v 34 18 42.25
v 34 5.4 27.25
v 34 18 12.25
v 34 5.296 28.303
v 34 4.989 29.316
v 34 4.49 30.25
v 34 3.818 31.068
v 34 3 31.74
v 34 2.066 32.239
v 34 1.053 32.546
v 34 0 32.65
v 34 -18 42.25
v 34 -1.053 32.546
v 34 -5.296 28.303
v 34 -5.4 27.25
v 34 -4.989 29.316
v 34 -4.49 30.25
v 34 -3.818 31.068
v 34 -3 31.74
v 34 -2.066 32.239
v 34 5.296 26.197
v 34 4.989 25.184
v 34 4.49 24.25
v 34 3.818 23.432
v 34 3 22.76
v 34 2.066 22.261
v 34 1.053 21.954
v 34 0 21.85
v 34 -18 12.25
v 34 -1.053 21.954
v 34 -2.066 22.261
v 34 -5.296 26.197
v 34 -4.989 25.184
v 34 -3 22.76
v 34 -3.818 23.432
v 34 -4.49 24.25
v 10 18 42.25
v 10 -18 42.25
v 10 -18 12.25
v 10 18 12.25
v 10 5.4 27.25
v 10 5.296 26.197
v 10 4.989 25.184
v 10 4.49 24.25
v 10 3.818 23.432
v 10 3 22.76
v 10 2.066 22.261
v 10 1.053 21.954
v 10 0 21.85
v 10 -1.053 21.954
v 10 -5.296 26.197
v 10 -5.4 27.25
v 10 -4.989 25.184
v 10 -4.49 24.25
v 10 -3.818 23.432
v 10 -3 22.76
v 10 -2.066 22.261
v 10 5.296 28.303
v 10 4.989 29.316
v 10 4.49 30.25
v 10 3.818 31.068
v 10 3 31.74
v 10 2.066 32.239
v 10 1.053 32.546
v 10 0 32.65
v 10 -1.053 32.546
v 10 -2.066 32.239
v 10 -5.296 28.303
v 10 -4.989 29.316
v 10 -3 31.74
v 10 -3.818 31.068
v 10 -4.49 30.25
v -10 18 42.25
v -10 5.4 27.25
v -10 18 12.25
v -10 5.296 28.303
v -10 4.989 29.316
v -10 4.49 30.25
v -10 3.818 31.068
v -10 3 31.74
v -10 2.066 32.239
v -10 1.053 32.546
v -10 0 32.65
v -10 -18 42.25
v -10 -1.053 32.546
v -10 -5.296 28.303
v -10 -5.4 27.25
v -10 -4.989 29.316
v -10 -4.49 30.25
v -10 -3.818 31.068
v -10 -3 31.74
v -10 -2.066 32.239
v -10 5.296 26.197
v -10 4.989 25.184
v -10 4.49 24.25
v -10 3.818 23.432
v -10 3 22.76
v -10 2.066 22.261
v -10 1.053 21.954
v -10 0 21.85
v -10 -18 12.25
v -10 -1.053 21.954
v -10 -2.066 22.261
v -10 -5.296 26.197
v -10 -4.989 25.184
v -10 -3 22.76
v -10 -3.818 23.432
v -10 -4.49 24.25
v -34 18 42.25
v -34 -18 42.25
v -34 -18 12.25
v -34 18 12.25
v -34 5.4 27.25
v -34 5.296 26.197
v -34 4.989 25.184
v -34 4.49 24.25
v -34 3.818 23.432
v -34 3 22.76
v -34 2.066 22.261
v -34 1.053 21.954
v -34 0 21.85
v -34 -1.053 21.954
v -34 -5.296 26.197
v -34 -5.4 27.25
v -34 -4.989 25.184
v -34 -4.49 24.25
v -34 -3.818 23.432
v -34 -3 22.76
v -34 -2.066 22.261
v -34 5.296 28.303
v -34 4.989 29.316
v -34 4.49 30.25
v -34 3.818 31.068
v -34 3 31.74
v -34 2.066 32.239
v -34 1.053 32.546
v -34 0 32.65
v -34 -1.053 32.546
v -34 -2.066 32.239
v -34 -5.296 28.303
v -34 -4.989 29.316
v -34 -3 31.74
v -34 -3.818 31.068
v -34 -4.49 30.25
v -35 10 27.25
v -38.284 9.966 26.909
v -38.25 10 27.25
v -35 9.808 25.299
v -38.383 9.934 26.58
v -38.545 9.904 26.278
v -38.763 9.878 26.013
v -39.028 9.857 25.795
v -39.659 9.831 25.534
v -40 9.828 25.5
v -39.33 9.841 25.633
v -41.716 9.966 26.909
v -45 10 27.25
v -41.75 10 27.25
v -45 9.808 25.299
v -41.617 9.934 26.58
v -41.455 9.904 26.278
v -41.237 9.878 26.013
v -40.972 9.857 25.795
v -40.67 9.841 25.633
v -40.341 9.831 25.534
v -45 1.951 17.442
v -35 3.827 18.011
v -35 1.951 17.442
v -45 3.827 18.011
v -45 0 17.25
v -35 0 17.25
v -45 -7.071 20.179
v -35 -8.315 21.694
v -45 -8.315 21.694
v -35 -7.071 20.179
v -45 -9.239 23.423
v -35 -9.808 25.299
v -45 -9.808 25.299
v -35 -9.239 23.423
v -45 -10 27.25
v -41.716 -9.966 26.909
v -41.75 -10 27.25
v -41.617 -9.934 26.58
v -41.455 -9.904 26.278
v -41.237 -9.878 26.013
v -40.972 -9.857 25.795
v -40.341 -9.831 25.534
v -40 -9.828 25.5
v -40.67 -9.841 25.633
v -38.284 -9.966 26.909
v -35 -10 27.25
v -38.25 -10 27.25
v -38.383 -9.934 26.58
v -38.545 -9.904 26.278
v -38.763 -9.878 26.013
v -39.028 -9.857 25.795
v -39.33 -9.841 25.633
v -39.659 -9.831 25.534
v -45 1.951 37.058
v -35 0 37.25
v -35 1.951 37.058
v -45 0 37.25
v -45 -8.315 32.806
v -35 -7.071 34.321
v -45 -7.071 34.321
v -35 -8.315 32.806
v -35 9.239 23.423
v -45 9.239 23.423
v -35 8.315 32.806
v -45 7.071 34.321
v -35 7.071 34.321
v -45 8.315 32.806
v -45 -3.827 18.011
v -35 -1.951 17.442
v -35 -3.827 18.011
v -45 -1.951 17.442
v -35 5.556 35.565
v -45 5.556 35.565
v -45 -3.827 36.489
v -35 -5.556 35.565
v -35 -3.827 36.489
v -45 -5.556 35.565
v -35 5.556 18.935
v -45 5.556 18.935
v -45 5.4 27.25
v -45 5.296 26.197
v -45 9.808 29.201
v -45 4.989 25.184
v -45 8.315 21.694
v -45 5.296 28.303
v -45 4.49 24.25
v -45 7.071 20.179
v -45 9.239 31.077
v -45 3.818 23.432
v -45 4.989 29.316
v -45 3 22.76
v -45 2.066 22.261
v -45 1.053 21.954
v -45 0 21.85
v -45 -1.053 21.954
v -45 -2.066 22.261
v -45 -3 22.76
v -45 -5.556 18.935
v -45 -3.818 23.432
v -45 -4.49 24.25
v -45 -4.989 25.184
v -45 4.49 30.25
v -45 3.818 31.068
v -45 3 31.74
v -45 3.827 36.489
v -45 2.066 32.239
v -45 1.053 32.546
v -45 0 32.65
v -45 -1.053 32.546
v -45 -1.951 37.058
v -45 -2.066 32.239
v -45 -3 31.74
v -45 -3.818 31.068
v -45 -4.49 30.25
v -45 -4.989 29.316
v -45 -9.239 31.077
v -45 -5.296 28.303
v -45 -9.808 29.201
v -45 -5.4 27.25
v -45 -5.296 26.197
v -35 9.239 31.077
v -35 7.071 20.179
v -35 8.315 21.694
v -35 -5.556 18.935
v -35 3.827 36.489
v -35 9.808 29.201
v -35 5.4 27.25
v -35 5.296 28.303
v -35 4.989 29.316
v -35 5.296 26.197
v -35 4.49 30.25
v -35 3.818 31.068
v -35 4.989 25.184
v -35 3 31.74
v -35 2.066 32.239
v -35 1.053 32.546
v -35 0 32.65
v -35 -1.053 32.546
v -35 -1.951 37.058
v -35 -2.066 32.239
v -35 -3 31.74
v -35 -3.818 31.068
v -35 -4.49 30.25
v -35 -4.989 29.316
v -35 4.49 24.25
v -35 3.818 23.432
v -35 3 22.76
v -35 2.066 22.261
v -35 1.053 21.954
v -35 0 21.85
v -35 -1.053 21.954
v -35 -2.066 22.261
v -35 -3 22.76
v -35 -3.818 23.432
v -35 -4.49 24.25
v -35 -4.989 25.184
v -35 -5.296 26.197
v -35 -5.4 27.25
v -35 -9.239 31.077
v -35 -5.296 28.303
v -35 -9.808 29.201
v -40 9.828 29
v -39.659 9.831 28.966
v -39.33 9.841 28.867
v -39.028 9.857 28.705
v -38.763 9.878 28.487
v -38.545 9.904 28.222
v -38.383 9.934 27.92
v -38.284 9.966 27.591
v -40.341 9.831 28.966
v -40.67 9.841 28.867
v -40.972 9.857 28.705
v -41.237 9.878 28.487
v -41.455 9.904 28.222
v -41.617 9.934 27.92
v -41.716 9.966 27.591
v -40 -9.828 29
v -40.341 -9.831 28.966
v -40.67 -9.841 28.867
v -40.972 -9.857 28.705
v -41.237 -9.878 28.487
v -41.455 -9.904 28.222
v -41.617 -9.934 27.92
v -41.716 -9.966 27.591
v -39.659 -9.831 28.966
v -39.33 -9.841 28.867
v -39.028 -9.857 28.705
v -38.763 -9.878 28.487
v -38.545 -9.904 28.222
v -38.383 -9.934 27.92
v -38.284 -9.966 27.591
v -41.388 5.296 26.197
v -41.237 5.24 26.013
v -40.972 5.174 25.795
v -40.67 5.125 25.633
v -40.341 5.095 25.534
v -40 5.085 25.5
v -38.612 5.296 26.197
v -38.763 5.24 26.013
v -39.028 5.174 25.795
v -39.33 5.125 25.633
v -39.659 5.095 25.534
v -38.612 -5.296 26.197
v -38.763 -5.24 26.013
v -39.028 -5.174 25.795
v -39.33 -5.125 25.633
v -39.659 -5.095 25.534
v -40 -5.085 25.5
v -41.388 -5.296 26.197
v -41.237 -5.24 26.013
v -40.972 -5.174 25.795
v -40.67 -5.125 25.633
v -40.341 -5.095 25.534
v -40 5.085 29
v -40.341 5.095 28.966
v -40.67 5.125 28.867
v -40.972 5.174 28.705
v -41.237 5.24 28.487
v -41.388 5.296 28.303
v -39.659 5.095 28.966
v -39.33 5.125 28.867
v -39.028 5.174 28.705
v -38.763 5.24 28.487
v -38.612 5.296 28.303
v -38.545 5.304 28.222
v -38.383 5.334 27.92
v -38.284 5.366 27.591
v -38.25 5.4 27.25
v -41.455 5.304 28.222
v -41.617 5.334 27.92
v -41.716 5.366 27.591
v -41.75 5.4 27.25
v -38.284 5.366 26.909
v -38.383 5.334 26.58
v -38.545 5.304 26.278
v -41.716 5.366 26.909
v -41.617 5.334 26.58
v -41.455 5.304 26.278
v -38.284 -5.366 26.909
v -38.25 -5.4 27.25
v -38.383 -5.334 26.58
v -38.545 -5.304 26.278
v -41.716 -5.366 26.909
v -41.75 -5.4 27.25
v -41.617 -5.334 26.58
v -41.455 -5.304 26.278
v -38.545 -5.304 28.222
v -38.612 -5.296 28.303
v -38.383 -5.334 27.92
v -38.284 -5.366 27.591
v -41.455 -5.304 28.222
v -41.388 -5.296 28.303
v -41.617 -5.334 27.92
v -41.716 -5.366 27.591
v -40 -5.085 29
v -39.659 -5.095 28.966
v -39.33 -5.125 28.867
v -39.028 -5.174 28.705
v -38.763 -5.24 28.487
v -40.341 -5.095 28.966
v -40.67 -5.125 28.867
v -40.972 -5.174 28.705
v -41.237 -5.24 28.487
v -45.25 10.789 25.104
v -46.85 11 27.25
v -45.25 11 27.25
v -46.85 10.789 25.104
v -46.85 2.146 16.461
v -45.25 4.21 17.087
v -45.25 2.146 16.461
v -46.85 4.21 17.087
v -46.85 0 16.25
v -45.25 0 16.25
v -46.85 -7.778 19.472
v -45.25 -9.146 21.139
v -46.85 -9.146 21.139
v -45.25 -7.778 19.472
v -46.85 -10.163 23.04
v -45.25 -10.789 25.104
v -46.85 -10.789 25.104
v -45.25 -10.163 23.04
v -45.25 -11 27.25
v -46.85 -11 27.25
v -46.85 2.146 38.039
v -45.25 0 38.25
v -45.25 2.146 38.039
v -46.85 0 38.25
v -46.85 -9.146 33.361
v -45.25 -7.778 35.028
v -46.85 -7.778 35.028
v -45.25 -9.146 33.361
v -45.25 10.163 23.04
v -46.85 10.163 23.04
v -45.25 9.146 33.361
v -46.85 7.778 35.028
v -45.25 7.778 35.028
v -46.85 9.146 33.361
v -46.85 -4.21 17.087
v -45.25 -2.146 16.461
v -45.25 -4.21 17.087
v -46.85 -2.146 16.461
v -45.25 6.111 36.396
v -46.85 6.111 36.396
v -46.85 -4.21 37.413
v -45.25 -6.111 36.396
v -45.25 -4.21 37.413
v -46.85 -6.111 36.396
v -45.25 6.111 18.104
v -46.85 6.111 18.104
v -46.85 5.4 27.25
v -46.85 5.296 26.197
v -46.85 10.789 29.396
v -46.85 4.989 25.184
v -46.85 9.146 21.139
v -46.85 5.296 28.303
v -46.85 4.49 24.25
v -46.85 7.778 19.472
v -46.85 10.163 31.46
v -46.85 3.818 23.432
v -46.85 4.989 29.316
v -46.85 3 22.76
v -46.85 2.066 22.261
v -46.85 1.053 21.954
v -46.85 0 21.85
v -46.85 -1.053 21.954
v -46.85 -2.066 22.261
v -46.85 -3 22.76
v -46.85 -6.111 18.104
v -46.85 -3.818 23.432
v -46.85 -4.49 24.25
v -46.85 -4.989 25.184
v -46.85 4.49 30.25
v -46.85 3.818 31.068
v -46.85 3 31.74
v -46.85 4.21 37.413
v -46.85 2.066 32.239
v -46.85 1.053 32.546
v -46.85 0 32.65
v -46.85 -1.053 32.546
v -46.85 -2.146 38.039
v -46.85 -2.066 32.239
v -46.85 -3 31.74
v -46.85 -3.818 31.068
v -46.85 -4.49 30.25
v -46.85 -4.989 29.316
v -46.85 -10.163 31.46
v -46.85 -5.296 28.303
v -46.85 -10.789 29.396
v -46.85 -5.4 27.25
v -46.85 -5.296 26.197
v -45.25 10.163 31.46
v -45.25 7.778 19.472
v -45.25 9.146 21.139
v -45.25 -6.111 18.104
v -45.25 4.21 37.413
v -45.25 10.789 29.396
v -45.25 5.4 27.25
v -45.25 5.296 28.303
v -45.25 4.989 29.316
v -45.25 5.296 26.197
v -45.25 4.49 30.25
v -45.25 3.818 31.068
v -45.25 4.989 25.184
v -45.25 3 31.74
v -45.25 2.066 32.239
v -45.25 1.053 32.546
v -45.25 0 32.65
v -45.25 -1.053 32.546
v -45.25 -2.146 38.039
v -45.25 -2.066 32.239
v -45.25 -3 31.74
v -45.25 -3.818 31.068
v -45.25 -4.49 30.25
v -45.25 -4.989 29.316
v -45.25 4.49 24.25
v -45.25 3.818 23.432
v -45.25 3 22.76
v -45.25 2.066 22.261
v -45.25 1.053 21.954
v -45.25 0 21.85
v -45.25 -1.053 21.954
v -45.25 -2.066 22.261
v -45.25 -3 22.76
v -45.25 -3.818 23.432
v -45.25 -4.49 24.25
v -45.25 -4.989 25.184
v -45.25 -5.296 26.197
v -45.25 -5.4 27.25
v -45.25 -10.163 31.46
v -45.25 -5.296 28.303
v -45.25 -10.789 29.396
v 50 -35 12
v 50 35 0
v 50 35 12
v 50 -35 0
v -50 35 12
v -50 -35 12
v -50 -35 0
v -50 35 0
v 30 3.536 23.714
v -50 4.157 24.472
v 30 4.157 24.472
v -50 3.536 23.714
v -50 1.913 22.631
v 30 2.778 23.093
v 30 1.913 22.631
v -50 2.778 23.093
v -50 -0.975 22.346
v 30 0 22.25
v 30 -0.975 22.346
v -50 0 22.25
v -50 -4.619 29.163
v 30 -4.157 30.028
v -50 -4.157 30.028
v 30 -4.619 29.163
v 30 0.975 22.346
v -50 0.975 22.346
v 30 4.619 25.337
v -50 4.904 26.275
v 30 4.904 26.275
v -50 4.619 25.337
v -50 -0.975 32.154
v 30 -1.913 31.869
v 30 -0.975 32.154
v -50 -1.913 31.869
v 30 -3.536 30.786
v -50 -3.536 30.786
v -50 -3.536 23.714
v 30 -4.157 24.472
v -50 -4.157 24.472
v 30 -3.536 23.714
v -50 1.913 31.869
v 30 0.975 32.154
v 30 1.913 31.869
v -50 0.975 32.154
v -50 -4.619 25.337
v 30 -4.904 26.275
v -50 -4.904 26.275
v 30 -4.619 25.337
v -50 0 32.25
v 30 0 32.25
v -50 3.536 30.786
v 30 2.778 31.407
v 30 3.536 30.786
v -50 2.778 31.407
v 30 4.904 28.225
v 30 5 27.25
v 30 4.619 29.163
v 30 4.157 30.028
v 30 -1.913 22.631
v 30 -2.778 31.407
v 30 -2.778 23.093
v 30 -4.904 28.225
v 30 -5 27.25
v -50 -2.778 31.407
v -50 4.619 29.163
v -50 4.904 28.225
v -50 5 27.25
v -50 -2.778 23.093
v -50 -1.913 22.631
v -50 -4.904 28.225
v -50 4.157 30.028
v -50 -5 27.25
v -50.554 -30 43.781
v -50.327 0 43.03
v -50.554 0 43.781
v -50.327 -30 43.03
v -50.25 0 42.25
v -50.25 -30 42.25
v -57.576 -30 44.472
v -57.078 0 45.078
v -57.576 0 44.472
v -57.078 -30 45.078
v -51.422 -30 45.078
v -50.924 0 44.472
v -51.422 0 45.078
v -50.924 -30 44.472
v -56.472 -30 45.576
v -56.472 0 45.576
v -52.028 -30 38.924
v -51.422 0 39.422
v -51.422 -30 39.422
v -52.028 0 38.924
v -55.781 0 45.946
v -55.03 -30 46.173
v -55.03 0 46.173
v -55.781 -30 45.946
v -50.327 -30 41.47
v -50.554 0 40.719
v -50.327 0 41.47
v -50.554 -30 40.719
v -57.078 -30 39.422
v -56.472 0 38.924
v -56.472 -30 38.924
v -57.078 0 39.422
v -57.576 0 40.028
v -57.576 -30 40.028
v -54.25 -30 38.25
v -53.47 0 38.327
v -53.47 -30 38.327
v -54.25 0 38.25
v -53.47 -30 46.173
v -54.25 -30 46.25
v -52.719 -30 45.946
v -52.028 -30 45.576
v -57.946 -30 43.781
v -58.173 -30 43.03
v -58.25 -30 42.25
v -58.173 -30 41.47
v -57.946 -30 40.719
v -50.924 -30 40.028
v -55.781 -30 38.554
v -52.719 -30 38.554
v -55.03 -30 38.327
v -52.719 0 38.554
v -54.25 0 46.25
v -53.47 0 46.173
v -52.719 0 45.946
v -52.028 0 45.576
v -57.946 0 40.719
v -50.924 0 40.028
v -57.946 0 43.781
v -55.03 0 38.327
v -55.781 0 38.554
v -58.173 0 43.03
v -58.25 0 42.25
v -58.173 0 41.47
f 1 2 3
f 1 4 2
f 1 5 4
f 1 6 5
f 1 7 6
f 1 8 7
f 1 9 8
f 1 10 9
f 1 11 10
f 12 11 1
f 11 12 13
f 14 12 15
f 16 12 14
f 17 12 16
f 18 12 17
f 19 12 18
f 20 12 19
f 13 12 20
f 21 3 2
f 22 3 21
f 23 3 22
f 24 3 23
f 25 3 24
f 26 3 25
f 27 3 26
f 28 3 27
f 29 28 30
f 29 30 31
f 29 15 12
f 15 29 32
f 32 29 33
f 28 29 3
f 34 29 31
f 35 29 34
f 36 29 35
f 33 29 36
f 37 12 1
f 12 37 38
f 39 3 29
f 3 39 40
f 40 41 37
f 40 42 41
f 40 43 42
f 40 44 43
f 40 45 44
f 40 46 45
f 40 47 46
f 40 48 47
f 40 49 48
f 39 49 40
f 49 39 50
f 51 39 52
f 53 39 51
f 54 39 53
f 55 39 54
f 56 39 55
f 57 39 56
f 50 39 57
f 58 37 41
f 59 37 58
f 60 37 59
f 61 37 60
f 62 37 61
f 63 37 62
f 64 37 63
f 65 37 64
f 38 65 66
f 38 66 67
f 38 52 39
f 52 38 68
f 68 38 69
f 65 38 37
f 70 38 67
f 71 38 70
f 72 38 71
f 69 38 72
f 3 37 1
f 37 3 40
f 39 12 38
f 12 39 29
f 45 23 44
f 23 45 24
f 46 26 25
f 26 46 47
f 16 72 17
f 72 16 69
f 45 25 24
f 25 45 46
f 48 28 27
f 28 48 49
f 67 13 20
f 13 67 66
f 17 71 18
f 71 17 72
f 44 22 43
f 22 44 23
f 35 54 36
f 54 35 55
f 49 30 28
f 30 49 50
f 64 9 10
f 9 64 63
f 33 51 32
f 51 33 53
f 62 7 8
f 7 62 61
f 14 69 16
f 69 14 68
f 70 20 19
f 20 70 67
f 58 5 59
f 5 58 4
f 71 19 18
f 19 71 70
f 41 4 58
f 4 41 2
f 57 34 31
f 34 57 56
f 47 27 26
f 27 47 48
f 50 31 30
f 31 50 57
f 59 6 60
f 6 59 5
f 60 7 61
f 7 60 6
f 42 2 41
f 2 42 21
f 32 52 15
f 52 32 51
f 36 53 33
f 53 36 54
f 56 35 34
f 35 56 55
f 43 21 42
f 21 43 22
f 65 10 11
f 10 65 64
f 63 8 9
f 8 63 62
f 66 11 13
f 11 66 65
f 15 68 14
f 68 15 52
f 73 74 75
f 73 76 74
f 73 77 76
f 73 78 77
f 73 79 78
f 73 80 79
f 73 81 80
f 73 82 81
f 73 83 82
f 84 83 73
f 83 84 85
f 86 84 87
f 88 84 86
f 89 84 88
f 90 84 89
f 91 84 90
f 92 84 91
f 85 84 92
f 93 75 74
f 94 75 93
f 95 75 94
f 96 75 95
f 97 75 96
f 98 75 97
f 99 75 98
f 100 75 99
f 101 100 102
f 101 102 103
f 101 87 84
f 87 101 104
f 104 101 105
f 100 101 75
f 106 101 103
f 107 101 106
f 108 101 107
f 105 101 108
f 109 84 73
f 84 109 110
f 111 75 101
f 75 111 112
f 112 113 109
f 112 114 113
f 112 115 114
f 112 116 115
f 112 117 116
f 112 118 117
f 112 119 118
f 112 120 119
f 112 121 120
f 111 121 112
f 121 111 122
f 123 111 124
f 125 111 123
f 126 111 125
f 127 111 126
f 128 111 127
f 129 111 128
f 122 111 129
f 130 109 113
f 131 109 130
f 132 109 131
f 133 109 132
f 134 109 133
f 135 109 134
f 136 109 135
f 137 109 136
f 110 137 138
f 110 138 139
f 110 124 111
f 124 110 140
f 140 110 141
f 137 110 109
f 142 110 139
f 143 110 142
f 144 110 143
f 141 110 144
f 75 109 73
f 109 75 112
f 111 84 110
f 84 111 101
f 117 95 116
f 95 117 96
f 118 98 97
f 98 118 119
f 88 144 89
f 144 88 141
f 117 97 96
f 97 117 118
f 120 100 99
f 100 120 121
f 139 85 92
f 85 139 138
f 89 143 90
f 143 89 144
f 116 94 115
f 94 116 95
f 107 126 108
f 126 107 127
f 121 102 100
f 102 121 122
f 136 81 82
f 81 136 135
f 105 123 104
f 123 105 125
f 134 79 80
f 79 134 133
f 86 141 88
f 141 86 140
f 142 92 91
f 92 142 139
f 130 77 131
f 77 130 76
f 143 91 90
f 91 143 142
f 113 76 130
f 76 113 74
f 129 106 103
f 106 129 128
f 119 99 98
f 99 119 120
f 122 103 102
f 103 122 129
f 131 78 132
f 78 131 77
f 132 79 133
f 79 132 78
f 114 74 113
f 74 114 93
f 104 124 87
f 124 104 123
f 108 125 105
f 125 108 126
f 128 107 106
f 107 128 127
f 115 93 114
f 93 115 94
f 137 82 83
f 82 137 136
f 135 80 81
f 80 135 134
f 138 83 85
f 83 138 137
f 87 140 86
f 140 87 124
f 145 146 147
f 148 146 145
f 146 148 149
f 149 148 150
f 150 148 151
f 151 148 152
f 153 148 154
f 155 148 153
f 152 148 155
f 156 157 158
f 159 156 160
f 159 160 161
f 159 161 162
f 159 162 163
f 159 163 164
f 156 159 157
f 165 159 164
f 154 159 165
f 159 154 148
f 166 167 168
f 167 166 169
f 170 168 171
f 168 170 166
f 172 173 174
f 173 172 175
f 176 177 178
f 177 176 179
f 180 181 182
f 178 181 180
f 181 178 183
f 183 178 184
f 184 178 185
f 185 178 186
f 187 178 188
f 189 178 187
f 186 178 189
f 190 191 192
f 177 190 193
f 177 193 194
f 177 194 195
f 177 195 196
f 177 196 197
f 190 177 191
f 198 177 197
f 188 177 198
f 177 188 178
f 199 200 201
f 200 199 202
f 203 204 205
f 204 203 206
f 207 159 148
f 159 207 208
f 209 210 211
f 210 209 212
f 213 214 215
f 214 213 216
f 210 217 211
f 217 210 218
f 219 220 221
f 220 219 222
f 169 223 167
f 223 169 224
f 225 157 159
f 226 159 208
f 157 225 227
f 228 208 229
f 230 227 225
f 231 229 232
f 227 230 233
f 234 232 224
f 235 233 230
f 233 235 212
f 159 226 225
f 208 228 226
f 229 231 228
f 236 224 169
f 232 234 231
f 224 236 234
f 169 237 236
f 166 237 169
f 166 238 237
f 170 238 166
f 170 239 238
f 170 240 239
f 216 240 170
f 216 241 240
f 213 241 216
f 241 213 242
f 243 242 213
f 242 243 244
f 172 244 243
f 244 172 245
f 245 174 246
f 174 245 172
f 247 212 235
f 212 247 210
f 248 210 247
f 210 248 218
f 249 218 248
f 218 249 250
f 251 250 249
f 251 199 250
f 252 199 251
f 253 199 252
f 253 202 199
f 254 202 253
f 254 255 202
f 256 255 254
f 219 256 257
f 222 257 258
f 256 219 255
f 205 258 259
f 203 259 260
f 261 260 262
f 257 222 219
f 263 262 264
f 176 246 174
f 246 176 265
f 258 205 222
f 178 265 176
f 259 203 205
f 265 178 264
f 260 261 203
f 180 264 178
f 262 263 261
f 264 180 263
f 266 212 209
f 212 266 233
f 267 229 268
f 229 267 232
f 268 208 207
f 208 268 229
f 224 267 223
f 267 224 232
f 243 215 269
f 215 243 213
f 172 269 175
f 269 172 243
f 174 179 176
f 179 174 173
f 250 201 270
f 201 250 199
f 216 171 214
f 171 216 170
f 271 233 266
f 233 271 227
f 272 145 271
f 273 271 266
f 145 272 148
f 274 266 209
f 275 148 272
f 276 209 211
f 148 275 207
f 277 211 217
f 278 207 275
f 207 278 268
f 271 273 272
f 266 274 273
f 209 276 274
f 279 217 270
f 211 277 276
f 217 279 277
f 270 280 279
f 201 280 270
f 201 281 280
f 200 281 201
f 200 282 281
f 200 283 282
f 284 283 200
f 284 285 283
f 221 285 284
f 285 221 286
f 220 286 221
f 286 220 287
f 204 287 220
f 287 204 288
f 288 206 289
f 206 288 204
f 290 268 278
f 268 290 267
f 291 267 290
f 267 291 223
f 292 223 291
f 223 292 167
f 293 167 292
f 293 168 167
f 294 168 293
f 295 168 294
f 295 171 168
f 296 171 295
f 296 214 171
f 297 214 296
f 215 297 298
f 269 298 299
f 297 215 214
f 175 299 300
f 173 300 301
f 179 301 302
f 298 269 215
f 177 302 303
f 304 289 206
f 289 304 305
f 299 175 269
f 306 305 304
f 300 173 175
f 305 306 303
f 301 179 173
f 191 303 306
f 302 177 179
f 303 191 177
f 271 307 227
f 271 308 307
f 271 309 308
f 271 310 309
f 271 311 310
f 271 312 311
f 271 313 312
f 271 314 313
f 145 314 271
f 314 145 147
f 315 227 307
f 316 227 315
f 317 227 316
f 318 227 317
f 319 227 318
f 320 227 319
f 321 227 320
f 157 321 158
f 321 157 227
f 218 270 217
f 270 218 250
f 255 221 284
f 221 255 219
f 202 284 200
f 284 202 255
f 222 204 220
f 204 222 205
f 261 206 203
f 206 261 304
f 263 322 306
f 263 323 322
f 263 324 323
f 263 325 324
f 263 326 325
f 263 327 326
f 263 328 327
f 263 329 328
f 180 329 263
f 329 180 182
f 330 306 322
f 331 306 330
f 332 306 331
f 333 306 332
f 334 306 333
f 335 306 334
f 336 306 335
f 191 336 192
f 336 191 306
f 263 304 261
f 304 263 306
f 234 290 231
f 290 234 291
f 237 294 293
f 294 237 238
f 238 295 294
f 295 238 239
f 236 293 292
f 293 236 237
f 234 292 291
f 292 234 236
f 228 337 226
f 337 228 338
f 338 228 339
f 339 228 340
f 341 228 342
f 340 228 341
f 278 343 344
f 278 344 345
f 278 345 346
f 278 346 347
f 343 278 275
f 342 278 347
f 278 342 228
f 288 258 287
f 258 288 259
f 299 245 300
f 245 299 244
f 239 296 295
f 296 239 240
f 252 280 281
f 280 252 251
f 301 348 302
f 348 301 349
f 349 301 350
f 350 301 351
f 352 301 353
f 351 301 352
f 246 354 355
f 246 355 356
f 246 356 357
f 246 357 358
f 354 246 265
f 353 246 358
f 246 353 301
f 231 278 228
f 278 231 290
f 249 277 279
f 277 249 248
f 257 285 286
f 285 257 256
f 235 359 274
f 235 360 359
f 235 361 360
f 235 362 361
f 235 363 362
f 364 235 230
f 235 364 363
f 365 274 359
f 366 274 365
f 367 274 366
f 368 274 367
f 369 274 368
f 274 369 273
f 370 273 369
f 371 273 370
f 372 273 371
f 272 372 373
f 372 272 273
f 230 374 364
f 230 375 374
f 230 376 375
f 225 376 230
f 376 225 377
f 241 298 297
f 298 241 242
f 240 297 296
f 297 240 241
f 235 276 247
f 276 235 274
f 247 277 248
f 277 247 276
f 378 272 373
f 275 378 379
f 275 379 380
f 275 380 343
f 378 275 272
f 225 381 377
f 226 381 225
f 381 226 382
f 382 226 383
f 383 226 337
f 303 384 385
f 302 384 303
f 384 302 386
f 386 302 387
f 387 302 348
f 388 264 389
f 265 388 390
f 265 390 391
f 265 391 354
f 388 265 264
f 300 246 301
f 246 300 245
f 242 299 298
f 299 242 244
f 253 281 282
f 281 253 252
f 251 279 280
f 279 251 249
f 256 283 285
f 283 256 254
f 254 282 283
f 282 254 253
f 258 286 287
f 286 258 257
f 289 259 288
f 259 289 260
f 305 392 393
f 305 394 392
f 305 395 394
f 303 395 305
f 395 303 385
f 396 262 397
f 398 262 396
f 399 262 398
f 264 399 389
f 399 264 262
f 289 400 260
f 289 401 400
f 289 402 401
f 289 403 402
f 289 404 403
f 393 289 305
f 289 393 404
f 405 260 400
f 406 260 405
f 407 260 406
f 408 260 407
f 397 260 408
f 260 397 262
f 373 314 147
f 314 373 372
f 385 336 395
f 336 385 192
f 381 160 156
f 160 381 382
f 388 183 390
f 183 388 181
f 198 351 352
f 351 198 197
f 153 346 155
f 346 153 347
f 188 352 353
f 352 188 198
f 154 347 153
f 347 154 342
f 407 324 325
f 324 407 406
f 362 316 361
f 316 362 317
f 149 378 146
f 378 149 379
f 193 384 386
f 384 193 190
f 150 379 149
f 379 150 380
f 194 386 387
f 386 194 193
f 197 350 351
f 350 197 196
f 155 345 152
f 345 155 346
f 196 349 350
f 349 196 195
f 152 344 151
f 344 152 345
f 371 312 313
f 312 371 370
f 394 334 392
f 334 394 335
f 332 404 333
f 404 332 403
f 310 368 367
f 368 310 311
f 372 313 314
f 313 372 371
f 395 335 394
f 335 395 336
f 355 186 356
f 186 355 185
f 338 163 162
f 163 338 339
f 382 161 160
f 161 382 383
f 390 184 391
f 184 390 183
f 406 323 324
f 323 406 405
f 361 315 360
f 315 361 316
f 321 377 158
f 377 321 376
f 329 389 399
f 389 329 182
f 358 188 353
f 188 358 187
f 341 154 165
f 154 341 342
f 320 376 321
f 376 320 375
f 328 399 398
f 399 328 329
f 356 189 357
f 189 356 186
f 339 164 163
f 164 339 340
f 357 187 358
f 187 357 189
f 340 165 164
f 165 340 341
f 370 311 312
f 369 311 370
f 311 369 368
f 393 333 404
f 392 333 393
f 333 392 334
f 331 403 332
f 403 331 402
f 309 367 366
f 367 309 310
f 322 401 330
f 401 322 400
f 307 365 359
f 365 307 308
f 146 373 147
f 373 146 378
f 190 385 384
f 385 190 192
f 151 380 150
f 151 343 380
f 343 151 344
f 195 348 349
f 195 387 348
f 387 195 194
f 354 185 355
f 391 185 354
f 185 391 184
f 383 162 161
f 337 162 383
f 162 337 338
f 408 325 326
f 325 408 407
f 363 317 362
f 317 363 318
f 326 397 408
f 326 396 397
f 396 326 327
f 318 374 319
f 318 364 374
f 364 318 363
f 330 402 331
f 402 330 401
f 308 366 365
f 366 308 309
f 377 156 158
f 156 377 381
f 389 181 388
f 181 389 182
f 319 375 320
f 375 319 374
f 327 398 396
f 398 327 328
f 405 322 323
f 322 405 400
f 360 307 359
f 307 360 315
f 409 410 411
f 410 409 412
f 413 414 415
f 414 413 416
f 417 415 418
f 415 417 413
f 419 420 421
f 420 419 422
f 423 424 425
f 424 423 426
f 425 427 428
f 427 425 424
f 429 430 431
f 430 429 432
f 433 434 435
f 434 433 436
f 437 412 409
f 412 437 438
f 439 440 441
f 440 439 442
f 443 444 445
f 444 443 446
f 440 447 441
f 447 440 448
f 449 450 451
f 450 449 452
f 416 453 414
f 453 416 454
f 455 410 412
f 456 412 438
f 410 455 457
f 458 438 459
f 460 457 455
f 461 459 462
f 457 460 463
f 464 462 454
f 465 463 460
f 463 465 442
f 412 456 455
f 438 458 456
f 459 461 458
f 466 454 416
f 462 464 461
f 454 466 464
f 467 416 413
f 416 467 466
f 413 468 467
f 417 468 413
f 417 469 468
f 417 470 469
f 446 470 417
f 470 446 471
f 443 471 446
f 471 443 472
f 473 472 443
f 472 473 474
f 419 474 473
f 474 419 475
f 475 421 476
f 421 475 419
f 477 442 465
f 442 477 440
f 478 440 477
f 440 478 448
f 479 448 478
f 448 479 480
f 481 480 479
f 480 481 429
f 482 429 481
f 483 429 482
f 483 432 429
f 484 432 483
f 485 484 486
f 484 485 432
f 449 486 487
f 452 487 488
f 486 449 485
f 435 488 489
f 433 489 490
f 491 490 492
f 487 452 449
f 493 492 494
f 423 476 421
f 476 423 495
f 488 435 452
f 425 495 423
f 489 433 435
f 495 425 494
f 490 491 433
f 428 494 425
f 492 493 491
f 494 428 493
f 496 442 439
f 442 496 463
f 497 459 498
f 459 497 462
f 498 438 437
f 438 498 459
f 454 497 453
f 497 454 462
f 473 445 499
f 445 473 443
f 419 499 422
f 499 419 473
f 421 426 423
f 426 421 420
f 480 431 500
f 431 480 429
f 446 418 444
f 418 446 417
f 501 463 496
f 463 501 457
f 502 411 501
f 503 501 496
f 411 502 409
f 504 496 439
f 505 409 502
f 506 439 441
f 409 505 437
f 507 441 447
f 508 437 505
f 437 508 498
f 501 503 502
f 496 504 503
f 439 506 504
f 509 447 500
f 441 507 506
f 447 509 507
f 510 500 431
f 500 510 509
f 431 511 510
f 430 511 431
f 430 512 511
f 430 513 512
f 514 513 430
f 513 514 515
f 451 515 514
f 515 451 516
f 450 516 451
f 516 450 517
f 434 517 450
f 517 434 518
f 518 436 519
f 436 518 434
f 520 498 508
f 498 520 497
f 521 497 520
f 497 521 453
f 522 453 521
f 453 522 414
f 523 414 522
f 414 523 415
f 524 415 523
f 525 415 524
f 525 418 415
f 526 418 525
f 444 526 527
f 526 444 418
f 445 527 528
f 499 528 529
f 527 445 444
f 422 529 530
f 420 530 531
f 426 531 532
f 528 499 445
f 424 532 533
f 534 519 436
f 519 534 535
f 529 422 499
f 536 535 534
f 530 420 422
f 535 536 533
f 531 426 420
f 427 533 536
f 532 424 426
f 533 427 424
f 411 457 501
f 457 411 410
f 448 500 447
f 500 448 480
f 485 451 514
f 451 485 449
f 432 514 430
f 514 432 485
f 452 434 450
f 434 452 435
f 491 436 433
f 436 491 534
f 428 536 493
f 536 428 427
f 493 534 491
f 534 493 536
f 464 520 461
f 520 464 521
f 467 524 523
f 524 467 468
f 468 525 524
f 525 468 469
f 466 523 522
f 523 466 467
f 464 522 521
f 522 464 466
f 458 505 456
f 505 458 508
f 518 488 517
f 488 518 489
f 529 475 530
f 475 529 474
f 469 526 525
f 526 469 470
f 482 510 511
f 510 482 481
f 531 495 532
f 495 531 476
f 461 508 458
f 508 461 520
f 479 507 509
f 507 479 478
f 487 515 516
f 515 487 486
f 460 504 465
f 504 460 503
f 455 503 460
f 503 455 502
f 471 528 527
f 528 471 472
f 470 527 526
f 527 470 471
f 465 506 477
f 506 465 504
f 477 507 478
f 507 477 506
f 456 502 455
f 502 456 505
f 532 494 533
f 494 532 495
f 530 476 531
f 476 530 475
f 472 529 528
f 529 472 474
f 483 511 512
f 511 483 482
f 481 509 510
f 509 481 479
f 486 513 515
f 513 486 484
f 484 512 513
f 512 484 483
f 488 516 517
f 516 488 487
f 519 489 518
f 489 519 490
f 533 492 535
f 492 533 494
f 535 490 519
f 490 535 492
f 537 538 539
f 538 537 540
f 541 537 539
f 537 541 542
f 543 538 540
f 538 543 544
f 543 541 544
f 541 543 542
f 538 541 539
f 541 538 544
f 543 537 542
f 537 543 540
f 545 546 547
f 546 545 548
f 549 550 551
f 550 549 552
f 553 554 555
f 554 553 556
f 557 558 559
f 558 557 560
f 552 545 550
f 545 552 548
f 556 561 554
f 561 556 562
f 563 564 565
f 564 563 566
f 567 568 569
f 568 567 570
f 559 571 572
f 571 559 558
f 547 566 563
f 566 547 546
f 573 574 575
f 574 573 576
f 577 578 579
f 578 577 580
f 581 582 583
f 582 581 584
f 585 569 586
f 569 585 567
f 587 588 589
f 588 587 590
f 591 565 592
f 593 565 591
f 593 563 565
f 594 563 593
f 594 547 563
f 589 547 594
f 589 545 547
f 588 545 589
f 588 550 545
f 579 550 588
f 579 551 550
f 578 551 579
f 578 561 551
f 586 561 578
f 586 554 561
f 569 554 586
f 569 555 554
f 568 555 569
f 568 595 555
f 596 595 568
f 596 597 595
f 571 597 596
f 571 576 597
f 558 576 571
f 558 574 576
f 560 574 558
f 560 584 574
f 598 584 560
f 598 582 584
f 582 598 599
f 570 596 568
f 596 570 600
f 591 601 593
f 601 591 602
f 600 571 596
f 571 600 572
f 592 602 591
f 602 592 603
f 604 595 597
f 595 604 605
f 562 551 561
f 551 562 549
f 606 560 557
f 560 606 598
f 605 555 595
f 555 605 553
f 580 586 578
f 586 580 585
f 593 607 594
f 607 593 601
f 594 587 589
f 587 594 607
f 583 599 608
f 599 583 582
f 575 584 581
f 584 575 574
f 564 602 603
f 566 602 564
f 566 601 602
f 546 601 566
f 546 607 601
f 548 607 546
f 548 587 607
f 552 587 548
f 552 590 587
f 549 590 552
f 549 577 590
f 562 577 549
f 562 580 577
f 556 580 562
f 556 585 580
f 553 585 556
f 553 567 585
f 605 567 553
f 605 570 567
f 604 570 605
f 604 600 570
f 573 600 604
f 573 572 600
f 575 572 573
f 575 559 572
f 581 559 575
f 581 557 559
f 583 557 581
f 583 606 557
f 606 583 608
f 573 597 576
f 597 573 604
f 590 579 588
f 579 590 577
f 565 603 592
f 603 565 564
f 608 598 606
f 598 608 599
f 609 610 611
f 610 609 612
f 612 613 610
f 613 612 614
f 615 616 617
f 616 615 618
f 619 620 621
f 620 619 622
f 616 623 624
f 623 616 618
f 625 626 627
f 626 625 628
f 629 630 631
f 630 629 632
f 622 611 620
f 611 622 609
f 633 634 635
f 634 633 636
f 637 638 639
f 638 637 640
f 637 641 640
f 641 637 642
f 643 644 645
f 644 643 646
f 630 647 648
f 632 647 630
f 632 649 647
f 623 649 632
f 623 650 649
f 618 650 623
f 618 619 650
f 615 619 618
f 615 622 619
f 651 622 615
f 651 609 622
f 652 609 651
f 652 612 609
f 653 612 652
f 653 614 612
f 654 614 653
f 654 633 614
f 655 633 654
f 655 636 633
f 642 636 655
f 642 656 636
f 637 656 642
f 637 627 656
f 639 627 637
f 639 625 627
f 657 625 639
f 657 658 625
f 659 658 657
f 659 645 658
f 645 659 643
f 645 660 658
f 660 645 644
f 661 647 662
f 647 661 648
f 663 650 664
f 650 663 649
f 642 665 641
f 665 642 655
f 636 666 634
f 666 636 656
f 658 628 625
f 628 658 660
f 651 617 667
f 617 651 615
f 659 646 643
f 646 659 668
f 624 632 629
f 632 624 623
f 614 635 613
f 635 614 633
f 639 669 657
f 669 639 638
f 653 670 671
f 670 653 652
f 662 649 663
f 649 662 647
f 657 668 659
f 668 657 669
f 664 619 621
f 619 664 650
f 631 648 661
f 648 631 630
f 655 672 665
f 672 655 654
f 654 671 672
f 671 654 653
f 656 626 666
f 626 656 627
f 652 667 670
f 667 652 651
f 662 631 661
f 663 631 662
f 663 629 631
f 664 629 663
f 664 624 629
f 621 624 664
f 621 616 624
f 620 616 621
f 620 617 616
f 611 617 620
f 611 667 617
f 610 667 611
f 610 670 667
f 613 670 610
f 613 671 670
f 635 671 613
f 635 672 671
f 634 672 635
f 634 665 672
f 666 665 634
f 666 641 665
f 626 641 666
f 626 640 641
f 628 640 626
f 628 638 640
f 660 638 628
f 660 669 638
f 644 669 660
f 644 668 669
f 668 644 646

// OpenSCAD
$fn = 32;

// ------------------------------------------------------------------------
// Machine vise: screw d10, jaws 24 x 30 mm
// Every part is its own module, assembly() places every instance.
// ------------------------------------------------------------------------

// --- part 1 ---
module vise_bed() {
  difference() {
    translate([-50, -35, 0]) cube([100, 70, 12]);
  }
}

// --- part 2 ---
module vise_jaw() {
  difference() {
    translate([-12, -18, 0]) cube([24, 36, 30]);
    translate([0, 0, 15]) rotate([0, 90, 0]) cylinder(h = 26, d = 10.8, center = true);
  }
}

// --- part 3 ---
module vise_screw() {
  translate([0, 0, -40]) cylinder(h = 80, d = 10);
}

// --- part 4 ---
module screw_collar() {
  difference() {
    cylinder(h = 10, d = 20);
    translate([0, 0, -1]) cylinder(h = 12, d = 10.8);
    translate([0, 0, 5]) rotate([90, 0, 0]) cylinder(h = 22, d = 3.5, center = true);
  }
}

// --- part 5 ---
module screw_washer() {
  difference() {
      translate([0, 0, 0]) cylinder(h = 1.6, d = 22);
      translate([0, 0, -1]) cylinder(h = 3.6, d = 10.8);
    }
}

// --- part 6 ---
module vise_handle() {
  cylinder(h = 30, d = 8);
}

// --- assembly ---
module assembly() {
  color([0.80, 0.24, 0.20]) translate([0, 0, 0]) rotate([0, 0, 0]) vise_bed();
  color([0.20, 0.45, 0.75]) translate([22, 0, 12.25]) rotate([0, 0, 0]) vise_jaw();
  color([0.25, 0.62, 0.32]) translate([-22, 0, 12.25]) rotate([0, 0, 0]) vise_jaw();
  color([0.92, 0.70, 0.18]) translate([-10, 0, 27.25]) rotate([0, 90, 0]) vise_screw();
  color([0.58, 0.35, 0.70]) translate([-45, 0, 27.25]) rotate([0, 90, 0]) screw_collar();
  color([0.16, 0.66, 0.66]) translate([-46.85, 0, 27.25]) rotate([0, 90, 0]) screw_washer();
  color([0.85, 0.48, 0.18]) translate([-54.25, 0, 42.25]) rotate([90, 0, 0]) vise_handle();
}

assembly();
